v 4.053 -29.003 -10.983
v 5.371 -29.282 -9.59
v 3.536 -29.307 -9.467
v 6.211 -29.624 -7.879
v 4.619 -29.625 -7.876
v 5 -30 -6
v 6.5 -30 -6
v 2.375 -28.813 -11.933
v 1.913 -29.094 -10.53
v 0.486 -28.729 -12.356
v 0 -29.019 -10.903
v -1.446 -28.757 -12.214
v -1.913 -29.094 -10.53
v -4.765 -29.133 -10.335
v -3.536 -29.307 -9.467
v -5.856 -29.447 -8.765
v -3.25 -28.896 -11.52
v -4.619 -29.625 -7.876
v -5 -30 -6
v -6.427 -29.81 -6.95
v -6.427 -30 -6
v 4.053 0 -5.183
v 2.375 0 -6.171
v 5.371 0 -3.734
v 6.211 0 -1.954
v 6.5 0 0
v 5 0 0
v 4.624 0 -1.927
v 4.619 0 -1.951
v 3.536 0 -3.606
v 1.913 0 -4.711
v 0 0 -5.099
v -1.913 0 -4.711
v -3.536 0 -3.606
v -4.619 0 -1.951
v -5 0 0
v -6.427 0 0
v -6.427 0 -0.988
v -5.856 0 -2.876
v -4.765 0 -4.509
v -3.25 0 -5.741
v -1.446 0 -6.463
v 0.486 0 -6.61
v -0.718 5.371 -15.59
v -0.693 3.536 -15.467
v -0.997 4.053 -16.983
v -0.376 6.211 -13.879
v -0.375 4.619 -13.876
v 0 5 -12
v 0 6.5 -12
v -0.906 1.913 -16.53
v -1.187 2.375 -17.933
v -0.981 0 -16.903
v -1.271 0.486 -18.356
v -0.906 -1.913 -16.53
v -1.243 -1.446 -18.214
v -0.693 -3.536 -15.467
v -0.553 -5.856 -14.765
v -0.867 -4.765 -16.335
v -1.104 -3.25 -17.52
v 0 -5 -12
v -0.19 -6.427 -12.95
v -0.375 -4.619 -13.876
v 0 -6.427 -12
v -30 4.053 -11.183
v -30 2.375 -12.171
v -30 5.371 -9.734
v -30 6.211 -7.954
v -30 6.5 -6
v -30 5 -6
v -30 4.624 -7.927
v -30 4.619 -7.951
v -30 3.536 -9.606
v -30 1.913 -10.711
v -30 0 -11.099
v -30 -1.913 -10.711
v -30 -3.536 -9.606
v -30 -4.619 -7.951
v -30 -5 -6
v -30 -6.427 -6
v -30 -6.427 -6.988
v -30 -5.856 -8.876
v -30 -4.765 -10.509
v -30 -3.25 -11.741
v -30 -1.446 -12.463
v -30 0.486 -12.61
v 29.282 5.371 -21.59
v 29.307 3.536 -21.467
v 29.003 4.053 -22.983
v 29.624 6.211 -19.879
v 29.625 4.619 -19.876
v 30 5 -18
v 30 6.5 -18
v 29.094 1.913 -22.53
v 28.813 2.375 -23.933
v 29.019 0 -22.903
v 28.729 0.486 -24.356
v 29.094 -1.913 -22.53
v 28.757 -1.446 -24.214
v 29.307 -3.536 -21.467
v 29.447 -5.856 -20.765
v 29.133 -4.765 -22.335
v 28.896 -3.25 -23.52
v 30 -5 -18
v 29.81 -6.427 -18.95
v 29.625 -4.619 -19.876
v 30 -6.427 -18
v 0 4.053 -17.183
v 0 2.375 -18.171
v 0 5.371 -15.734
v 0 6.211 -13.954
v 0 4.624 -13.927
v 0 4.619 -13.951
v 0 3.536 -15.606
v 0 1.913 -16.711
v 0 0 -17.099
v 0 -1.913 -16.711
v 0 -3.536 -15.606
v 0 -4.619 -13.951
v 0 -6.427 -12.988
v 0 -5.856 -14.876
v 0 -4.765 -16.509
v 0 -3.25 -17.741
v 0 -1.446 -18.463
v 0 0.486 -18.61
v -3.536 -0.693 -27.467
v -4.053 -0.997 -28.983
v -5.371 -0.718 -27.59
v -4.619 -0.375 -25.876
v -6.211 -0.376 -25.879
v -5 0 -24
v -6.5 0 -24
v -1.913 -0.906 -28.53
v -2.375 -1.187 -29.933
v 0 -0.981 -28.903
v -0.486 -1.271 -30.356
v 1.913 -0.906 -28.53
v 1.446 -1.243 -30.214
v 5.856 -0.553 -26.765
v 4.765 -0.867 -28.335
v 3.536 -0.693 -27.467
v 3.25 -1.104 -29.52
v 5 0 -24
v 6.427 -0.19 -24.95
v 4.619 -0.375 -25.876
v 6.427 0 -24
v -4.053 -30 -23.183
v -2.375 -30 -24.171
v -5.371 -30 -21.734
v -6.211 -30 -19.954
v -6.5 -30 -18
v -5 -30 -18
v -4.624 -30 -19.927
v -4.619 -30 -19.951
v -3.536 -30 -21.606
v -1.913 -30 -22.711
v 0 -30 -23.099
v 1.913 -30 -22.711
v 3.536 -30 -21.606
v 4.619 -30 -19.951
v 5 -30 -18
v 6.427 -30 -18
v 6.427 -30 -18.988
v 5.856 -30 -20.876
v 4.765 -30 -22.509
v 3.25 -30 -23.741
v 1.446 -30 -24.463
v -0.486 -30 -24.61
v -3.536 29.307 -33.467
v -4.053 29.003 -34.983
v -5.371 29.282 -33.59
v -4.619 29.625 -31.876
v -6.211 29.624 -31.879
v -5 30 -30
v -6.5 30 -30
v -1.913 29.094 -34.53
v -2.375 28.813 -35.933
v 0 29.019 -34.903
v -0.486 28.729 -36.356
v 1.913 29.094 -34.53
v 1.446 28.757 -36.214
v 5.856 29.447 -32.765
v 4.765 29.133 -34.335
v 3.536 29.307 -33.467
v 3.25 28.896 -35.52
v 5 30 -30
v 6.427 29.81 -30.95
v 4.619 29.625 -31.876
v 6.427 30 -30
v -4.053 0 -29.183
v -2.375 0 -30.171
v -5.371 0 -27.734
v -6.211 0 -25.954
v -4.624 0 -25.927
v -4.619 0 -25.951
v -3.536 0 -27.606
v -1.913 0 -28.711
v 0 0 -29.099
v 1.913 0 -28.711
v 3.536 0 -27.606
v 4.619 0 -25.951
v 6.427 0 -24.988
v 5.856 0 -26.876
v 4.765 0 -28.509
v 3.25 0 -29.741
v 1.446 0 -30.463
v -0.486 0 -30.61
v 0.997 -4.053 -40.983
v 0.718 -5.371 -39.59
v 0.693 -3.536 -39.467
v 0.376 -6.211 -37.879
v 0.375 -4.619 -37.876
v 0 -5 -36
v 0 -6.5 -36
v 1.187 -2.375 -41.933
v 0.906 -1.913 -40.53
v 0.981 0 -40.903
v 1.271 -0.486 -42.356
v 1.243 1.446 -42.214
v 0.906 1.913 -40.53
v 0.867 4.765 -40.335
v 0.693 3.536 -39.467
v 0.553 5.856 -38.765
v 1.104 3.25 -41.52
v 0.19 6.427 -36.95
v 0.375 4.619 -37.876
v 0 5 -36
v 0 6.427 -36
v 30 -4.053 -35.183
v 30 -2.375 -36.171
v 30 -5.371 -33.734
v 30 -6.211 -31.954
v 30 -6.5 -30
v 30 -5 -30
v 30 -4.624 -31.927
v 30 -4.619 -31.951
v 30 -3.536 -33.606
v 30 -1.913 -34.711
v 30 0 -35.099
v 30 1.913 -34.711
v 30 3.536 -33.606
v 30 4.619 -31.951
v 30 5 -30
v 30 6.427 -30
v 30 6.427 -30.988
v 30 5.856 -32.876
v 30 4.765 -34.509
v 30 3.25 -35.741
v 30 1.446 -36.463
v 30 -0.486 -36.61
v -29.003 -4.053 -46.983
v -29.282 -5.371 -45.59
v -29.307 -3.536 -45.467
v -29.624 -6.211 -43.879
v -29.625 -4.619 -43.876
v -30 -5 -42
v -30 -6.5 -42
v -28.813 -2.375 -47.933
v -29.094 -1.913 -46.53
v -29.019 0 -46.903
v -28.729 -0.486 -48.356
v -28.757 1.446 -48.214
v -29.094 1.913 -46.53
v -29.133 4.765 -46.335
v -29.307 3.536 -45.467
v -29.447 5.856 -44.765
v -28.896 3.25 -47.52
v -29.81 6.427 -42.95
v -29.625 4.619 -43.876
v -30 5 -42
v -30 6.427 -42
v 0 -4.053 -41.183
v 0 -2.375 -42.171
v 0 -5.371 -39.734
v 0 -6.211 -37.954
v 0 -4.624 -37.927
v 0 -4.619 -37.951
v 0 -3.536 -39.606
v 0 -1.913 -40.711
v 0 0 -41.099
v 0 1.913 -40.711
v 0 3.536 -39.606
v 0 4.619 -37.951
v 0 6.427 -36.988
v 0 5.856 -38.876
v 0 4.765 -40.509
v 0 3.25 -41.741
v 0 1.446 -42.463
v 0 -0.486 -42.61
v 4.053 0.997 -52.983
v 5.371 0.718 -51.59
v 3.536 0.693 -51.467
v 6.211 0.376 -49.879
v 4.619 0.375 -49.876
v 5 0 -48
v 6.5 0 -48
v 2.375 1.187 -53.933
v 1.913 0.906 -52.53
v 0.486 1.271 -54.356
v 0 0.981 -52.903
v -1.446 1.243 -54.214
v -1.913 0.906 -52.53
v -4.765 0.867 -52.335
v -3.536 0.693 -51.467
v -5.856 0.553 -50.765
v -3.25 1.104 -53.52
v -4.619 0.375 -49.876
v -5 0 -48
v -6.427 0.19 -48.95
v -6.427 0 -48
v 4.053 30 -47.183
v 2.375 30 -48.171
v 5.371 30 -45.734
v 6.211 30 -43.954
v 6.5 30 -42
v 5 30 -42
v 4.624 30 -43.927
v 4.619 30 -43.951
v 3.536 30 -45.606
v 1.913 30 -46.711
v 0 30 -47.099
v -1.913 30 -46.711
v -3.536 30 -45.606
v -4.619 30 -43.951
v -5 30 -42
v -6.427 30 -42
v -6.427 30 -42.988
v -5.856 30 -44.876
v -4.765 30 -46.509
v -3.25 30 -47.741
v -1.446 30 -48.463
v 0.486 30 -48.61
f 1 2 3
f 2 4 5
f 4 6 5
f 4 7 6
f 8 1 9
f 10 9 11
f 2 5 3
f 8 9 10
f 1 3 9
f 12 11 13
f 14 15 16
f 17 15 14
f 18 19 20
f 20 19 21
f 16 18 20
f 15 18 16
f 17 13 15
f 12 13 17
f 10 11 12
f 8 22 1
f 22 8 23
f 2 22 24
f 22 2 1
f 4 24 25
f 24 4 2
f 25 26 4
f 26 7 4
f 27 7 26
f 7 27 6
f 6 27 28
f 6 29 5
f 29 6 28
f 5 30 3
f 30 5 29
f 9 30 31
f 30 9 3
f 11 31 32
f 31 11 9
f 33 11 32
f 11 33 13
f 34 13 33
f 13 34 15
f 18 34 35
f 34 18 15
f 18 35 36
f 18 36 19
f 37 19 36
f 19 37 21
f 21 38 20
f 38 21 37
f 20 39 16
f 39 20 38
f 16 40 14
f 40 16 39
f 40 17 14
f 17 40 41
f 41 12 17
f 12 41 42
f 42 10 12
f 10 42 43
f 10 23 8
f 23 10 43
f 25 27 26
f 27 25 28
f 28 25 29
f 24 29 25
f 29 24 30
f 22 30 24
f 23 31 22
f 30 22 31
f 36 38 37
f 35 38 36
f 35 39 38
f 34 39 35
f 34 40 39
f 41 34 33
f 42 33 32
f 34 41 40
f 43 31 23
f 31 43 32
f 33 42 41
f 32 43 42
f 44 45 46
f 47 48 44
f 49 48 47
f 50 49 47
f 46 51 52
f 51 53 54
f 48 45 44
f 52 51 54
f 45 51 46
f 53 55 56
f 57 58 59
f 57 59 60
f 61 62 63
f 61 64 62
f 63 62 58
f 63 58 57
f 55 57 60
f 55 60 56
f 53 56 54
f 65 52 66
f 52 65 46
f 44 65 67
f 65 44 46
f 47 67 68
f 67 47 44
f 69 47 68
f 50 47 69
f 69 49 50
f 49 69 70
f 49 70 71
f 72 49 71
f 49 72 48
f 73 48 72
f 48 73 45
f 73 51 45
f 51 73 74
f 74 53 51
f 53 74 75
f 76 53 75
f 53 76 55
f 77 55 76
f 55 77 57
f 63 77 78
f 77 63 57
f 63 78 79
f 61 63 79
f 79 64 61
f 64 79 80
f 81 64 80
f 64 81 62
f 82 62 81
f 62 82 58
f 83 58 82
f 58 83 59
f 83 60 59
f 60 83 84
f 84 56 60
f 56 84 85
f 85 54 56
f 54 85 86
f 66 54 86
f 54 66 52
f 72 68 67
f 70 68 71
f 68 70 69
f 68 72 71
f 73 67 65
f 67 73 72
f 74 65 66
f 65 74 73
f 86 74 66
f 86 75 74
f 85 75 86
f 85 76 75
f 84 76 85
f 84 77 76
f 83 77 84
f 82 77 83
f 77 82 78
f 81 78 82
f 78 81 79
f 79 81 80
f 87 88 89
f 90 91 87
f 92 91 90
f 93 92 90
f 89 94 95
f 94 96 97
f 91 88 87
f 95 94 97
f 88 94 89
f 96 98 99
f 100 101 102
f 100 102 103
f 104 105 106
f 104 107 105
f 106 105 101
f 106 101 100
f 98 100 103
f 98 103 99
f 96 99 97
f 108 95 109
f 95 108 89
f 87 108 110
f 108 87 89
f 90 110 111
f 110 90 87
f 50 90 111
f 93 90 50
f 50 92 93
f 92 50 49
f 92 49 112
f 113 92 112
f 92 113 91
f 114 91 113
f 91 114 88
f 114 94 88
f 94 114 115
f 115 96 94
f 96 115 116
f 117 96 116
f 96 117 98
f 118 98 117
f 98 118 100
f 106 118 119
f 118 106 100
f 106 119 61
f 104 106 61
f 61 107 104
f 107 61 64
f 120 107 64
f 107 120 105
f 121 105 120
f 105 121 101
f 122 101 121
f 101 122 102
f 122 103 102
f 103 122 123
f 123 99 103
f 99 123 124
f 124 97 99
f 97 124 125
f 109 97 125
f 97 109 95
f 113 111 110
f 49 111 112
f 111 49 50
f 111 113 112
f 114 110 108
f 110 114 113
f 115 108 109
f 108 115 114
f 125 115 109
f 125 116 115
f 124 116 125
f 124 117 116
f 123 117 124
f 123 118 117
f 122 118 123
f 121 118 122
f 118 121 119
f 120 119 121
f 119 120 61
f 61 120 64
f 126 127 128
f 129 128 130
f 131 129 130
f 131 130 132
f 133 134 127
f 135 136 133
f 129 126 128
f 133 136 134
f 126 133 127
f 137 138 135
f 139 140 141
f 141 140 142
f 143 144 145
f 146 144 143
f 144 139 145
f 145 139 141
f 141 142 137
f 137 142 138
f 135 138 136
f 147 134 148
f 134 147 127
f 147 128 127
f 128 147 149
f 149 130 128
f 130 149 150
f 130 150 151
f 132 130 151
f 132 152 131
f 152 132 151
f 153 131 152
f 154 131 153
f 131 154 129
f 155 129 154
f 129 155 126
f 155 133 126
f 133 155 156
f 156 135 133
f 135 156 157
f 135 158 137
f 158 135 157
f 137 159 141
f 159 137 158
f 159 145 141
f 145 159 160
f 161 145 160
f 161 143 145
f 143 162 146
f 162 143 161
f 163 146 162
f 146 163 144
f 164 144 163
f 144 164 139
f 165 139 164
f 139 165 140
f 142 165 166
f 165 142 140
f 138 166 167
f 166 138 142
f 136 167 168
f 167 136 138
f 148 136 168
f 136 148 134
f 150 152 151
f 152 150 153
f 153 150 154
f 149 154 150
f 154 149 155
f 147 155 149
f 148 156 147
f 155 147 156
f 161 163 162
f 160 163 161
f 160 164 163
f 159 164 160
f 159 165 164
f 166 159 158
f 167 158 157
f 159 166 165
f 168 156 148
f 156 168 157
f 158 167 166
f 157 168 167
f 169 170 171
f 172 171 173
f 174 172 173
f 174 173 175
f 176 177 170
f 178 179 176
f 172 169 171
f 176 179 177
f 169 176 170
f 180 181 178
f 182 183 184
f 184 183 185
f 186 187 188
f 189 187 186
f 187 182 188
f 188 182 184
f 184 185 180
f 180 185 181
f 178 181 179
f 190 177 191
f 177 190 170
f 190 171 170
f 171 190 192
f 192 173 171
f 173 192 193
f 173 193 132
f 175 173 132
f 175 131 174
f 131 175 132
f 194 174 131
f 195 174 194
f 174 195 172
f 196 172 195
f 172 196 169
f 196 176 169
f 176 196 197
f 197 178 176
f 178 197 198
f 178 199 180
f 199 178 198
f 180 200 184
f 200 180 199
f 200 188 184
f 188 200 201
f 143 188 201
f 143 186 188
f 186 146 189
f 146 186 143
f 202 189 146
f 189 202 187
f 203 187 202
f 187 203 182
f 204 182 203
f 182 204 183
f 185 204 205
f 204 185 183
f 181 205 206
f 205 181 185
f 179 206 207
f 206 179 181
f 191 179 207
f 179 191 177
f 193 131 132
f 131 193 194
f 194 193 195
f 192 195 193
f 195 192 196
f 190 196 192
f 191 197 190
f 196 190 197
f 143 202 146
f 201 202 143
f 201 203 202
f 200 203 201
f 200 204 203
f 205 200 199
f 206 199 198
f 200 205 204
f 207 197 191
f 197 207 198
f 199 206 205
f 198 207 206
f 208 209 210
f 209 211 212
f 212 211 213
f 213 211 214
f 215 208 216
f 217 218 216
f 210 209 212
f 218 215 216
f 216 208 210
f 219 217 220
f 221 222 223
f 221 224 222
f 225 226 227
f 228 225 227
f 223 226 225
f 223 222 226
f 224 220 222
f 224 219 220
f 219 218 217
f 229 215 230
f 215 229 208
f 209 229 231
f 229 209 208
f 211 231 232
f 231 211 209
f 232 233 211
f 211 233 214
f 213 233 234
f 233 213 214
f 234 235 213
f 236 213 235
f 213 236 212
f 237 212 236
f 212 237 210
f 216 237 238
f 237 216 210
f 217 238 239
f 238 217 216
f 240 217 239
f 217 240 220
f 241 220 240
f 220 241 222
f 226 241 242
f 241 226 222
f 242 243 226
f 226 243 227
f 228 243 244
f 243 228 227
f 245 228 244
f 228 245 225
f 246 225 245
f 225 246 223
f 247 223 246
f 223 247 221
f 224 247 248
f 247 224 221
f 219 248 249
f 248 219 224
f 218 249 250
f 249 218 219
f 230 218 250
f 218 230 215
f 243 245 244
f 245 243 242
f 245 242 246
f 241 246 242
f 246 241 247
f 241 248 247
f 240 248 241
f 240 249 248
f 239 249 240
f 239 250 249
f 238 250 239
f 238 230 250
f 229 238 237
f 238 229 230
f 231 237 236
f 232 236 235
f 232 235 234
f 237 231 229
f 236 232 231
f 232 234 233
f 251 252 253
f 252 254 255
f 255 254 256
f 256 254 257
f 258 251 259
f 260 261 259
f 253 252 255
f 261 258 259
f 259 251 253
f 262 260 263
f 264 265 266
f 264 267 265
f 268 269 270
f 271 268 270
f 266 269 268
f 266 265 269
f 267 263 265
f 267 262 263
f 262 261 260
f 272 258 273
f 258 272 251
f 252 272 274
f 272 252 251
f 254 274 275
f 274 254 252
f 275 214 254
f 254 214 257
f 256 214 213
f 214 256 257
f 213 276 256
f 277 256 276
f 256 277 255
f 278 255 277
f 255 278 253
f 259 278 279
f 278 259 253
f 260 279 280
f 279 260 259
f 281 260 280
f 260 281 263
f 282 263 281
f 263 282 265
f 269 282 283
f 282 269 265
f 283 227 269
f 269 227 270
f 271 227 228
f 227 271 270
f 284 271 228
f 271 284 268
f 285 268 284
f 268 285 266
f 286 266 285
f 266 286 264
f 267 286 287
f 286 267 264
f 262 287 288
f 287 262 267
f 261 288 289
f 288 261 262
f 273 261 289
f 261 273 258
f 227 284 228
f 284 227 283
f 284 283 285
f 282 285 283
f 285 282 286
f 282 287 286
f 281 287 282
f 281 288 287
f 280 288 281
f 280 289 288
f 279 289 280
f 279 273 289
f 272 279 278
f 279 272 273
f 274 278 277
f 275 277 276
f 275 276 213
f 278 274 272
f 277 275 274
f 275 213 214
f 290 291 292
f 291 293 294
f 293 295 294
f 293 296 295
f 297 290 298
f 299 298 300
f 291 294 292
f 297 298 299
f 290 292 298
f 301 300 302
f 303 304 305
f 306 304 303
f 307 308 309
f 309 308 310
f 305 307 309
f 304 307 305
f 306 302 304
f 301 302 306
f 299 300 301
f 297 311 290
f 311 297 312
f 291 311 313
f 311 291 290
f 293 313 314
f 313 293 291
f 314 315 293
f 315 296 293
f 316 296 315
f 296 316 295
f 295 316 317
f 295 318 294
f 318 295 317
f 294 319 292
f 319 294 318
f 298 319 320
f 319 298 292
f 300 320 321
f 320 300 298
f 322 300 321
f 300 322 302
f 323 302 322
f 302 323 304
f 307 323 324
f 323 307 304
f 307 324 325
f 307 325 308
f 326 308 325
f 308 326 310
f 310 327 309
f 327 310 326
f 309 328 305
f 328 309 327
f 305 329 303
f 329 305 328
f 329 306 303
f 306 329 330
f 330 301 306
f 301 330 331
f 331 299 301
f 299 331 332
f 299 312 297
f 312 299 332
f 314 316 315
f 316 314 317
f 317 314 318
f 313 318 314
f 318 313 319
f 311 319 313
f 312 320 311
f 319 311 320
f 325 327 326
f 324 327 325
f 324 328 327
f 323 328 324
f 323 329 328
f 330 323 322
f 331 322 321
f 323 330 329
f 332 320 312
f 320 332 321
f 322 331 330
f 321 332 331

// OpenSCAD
tube_size = 5;
tube_thickness = 1.5;

total_size = tube_size+tube_thickness;



module turn(radius, turn_angle, angle){
    translate([-radius,0,0])
    difference(){
        rotate_extrude(angle=turn_angle)
        translate([radius,0,0])
        difference(){
            circle(total_size);
            circle(tube_size);
            rotate([0,0,angle]) translate([-total_size, 0, 0])square(total_size*2);
        }
        translate([-radius-total_size,0,-total_size]) cube([(radius+total_size)*2,radius+total_size,total_size*2]);
        rotate([0,0,180-turn_angle]) translate([-radius-total_size,0,-total_size]) cube([(radius+total_size)*2,radius+total_size,total_size*2]);
    }
    
    
      
}

module tube(length, start_angle, end_angle, drop){
    drop_angle = 90-atan2(length, drop);
    difference(){
        union(){        
            translate([0, -length, -drop]) rotate([drop_angle,0,0]) rotate([0,90+end_angle,0]) turn(0, drop_angle, 90);
            rotate([drop_angle+90,0,0])
            linear_extrude( sqrt(pow(length,2)+pow(drop,2)) , twist=end_angle-start_angle)
            difference(){
                circle(total_size);
                #circle(tube_size);
                rotate([0,0,start_angle]) translate([-total_size, 0, 0])square(total_size*2);
            }
        }
        translate([-total_size, 0, -total_size*2]) cube([total_size*2,total_size,total_size*2]);
    }
}
rotate([0,90,180]) turn(0, 90, 90);
level_drop = 6;
for (level = [0:3]) {
    translate([0,0,-level_drop*2*level]) rotate([0,0,90*level]) {
        tube(30, 0, 0, level_drop);
        translate([0,-30,-level_drop]) turn(30, 180, 0);
        translate([-60,-30,-level_drop]) rotate([0,0,180]) turn(30, 90, 0);
        translate([-30,0,-level_drop]) rotate([0,0,90]) tube(30, 0, 0, level_drop);
    }

}
translate([0,0,-level_drop*4*2]) rotate([0,90,0]) turn(0, 90, 90);
